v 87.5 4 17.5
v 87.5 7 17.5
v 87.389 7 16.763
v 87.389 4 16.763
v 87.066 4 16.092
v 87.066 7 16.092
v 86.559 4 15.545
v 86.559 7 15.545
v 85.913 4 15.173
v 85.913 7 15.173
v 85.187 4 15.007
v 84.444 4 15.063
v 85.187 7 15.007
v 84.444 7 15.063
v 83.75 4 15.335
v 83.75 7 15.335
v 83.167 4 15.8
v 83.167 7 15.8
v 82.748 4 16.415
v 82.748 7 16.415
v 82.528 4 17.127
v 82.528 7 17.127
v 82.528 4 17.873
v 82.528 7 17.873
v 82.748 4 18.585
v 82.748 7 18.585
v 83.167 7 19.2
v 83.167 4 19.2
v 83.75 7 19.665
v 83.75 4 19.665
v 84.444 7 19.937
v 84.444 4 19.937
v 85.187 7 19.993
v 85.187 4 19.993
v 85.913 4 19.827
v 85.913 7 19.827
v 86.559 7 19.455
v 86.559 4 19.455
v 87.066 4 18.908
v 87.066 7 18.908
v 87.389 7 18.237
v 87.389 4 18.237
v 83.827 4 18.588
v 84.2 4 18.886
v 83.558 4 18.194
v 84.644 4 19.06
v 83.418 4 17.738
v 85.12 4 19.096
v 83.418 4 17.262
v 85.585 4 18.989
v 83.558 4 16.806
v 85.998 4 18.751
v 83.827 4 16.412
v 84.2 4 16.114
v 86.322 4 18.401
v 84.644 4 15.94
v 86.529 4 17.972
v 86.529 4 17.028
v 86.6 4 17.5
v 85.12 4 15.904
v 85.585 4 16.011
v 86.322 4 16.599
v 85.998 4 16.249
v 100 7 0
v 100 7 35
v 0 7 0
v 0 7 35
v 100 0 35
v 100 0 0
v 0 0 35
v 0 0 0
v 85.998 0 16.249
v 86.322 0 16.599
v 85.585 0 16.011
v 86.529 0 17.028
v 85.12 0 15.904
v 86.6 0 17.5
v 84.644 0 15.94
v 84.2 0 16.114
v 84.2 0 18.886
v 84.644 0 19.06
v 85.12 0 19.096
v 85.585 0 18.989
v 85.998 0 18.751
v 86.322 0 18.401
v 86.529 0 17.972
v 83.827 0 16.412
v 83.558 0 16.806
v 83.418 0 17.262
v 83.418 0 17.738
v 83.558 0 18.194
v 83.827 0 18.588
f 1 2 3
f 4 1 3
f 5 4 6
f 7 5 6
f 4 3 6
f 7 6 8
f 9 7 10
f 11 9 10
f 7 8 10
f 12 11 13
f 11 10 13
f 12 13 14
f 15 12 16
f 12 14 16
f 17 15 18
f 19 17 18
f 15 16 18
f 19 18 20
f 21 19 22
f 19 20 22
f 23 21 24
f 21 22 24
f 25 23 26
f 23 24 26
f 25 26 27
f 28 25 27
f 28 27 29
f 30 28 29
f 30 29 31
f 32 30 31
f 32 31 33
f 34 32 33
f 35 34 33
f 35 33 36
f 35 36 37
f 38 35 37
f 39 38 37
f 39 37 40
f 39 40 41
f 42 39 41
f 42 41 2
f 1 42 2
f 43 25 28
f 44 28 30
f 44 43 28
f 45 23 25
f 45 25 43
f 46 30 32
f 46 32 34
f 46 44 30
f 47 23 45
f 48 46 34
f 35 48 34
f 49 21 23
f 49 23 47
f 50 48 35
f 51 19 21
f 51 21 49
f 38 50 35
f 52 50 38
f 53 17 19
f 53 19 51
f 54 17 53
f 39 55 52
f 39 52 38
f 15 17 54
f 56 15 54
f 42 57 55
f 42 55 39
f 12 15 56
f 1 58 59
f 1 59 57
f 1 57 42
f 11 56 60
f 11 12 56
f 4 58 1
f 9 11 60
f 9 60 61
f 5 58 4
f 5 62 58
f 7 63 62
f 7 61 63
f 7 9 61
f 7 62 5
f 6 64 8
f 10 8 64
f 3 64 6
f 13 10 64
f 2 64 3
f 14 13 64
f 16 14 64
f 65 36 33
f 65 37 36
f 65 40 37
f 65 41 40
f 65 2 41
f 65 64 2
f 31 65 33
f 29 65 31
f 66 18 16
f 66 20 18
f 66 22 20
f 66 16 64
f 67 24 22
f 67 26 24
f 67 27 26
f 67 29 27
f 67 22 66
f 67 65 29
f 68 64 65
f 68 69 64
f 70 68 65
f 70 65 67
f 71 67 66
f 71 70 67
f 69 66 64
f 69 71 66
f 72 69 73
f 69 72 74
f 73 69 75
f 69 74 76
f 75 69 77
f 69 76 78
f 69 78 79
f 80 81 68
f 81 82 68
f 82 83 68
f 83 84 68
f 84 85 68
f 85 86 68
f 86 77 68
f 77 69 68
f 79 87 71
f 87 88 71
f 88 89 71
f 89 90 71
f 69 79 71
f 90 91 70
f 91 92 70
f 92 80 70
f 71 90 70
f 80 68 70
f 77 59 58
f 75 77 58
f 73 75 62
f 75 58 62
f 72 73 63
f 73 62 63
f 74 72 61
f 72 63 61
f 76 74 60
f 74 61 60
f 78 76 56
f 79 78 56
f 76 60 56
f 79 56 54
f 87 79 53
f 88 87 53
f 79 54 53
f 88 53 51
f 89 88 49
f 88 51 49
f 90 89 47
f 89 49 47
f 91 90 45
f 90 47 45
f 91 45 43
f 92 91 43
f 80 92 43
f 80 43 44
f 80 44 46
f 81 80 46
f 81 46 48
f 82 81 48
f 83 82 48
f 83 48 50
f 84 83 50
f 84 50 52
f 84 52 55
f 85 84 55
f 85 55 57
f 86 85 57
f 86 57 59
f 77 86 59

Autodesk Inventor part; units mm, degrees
ref_plane "YZ Plane" through (0, 0, 0) normal (1, 0, 0) x (0, 1, 0)
ref_plane "XZ Plane" through (0, 0, 0) normal (0, 1, 0) x (-1, 0, 0)
ref_plane "XY Plane" through (0, 0, 0) normal (0, 0, 1) x (1, 0, 0)
sketch "Sketch1" plane through (0, 0, 0) normal (0, 1, 0) x (-1, 0, 0)
  line L0 (0, 0) -> (-100, 0)
  line L1 (-100, 0) -> (-100, 35)
  line L2 (-100, 35) -> (0, 35)
  line L3 (0, 35) -> (0, 0)
  dimension "d0" = 100
  dimension "d1" = 35
extrude "Extrusion1" add sketch "Sketch1" along normal blind 7
sketch "Sketch2" plane through (0, 7, 0) normal (0, 1, 0) x (1, 0, 0)
  line L0 (0, 0) -> (0, -35) projected
  line L1 (100, -35) -> (100, 0) projected
  circle A0 centre (85, -17.5) radius 1.5
  line L2 (0, -35) -> (100, -35) projected
  line L3 (50, -35) -> (50, 0)
  line L4 (100, 0) -> (0, 0) projected
  circle A1 centre (85, -17.5) radius 2.5
  point P0 (0, -17.5)
  dimension "d6" = 3
  dimension "d8" = 5
extrude "Extrusion2" cut sketch "Sketch2" against normal blind 3 contours A0 | A1
sketch "Sketch3" plane through (85, 4, 17.5) normal (0, 1, 0) x (1, 0, 0)
  circle A0 centre (0, 0) radius 1.6
  point P0 (-85, 17.5)
  dimension "d11" = 3.2
extrude "Extrusion3" cut sketch "Sketch3" against normal blind 4
sketch "Sketch4" plane through (0, 7, 0) normal (0, 1, 0) x (1, 0, 0)
  line L0 (100, -35) -> (100, 0) projected
  line L1 (0, 0) -> (0, -35) projected
  point P0 (0, -17.5)
  dimension "d14" = 100
  dimension "d15" = 35
properties part number "piano di carico"
